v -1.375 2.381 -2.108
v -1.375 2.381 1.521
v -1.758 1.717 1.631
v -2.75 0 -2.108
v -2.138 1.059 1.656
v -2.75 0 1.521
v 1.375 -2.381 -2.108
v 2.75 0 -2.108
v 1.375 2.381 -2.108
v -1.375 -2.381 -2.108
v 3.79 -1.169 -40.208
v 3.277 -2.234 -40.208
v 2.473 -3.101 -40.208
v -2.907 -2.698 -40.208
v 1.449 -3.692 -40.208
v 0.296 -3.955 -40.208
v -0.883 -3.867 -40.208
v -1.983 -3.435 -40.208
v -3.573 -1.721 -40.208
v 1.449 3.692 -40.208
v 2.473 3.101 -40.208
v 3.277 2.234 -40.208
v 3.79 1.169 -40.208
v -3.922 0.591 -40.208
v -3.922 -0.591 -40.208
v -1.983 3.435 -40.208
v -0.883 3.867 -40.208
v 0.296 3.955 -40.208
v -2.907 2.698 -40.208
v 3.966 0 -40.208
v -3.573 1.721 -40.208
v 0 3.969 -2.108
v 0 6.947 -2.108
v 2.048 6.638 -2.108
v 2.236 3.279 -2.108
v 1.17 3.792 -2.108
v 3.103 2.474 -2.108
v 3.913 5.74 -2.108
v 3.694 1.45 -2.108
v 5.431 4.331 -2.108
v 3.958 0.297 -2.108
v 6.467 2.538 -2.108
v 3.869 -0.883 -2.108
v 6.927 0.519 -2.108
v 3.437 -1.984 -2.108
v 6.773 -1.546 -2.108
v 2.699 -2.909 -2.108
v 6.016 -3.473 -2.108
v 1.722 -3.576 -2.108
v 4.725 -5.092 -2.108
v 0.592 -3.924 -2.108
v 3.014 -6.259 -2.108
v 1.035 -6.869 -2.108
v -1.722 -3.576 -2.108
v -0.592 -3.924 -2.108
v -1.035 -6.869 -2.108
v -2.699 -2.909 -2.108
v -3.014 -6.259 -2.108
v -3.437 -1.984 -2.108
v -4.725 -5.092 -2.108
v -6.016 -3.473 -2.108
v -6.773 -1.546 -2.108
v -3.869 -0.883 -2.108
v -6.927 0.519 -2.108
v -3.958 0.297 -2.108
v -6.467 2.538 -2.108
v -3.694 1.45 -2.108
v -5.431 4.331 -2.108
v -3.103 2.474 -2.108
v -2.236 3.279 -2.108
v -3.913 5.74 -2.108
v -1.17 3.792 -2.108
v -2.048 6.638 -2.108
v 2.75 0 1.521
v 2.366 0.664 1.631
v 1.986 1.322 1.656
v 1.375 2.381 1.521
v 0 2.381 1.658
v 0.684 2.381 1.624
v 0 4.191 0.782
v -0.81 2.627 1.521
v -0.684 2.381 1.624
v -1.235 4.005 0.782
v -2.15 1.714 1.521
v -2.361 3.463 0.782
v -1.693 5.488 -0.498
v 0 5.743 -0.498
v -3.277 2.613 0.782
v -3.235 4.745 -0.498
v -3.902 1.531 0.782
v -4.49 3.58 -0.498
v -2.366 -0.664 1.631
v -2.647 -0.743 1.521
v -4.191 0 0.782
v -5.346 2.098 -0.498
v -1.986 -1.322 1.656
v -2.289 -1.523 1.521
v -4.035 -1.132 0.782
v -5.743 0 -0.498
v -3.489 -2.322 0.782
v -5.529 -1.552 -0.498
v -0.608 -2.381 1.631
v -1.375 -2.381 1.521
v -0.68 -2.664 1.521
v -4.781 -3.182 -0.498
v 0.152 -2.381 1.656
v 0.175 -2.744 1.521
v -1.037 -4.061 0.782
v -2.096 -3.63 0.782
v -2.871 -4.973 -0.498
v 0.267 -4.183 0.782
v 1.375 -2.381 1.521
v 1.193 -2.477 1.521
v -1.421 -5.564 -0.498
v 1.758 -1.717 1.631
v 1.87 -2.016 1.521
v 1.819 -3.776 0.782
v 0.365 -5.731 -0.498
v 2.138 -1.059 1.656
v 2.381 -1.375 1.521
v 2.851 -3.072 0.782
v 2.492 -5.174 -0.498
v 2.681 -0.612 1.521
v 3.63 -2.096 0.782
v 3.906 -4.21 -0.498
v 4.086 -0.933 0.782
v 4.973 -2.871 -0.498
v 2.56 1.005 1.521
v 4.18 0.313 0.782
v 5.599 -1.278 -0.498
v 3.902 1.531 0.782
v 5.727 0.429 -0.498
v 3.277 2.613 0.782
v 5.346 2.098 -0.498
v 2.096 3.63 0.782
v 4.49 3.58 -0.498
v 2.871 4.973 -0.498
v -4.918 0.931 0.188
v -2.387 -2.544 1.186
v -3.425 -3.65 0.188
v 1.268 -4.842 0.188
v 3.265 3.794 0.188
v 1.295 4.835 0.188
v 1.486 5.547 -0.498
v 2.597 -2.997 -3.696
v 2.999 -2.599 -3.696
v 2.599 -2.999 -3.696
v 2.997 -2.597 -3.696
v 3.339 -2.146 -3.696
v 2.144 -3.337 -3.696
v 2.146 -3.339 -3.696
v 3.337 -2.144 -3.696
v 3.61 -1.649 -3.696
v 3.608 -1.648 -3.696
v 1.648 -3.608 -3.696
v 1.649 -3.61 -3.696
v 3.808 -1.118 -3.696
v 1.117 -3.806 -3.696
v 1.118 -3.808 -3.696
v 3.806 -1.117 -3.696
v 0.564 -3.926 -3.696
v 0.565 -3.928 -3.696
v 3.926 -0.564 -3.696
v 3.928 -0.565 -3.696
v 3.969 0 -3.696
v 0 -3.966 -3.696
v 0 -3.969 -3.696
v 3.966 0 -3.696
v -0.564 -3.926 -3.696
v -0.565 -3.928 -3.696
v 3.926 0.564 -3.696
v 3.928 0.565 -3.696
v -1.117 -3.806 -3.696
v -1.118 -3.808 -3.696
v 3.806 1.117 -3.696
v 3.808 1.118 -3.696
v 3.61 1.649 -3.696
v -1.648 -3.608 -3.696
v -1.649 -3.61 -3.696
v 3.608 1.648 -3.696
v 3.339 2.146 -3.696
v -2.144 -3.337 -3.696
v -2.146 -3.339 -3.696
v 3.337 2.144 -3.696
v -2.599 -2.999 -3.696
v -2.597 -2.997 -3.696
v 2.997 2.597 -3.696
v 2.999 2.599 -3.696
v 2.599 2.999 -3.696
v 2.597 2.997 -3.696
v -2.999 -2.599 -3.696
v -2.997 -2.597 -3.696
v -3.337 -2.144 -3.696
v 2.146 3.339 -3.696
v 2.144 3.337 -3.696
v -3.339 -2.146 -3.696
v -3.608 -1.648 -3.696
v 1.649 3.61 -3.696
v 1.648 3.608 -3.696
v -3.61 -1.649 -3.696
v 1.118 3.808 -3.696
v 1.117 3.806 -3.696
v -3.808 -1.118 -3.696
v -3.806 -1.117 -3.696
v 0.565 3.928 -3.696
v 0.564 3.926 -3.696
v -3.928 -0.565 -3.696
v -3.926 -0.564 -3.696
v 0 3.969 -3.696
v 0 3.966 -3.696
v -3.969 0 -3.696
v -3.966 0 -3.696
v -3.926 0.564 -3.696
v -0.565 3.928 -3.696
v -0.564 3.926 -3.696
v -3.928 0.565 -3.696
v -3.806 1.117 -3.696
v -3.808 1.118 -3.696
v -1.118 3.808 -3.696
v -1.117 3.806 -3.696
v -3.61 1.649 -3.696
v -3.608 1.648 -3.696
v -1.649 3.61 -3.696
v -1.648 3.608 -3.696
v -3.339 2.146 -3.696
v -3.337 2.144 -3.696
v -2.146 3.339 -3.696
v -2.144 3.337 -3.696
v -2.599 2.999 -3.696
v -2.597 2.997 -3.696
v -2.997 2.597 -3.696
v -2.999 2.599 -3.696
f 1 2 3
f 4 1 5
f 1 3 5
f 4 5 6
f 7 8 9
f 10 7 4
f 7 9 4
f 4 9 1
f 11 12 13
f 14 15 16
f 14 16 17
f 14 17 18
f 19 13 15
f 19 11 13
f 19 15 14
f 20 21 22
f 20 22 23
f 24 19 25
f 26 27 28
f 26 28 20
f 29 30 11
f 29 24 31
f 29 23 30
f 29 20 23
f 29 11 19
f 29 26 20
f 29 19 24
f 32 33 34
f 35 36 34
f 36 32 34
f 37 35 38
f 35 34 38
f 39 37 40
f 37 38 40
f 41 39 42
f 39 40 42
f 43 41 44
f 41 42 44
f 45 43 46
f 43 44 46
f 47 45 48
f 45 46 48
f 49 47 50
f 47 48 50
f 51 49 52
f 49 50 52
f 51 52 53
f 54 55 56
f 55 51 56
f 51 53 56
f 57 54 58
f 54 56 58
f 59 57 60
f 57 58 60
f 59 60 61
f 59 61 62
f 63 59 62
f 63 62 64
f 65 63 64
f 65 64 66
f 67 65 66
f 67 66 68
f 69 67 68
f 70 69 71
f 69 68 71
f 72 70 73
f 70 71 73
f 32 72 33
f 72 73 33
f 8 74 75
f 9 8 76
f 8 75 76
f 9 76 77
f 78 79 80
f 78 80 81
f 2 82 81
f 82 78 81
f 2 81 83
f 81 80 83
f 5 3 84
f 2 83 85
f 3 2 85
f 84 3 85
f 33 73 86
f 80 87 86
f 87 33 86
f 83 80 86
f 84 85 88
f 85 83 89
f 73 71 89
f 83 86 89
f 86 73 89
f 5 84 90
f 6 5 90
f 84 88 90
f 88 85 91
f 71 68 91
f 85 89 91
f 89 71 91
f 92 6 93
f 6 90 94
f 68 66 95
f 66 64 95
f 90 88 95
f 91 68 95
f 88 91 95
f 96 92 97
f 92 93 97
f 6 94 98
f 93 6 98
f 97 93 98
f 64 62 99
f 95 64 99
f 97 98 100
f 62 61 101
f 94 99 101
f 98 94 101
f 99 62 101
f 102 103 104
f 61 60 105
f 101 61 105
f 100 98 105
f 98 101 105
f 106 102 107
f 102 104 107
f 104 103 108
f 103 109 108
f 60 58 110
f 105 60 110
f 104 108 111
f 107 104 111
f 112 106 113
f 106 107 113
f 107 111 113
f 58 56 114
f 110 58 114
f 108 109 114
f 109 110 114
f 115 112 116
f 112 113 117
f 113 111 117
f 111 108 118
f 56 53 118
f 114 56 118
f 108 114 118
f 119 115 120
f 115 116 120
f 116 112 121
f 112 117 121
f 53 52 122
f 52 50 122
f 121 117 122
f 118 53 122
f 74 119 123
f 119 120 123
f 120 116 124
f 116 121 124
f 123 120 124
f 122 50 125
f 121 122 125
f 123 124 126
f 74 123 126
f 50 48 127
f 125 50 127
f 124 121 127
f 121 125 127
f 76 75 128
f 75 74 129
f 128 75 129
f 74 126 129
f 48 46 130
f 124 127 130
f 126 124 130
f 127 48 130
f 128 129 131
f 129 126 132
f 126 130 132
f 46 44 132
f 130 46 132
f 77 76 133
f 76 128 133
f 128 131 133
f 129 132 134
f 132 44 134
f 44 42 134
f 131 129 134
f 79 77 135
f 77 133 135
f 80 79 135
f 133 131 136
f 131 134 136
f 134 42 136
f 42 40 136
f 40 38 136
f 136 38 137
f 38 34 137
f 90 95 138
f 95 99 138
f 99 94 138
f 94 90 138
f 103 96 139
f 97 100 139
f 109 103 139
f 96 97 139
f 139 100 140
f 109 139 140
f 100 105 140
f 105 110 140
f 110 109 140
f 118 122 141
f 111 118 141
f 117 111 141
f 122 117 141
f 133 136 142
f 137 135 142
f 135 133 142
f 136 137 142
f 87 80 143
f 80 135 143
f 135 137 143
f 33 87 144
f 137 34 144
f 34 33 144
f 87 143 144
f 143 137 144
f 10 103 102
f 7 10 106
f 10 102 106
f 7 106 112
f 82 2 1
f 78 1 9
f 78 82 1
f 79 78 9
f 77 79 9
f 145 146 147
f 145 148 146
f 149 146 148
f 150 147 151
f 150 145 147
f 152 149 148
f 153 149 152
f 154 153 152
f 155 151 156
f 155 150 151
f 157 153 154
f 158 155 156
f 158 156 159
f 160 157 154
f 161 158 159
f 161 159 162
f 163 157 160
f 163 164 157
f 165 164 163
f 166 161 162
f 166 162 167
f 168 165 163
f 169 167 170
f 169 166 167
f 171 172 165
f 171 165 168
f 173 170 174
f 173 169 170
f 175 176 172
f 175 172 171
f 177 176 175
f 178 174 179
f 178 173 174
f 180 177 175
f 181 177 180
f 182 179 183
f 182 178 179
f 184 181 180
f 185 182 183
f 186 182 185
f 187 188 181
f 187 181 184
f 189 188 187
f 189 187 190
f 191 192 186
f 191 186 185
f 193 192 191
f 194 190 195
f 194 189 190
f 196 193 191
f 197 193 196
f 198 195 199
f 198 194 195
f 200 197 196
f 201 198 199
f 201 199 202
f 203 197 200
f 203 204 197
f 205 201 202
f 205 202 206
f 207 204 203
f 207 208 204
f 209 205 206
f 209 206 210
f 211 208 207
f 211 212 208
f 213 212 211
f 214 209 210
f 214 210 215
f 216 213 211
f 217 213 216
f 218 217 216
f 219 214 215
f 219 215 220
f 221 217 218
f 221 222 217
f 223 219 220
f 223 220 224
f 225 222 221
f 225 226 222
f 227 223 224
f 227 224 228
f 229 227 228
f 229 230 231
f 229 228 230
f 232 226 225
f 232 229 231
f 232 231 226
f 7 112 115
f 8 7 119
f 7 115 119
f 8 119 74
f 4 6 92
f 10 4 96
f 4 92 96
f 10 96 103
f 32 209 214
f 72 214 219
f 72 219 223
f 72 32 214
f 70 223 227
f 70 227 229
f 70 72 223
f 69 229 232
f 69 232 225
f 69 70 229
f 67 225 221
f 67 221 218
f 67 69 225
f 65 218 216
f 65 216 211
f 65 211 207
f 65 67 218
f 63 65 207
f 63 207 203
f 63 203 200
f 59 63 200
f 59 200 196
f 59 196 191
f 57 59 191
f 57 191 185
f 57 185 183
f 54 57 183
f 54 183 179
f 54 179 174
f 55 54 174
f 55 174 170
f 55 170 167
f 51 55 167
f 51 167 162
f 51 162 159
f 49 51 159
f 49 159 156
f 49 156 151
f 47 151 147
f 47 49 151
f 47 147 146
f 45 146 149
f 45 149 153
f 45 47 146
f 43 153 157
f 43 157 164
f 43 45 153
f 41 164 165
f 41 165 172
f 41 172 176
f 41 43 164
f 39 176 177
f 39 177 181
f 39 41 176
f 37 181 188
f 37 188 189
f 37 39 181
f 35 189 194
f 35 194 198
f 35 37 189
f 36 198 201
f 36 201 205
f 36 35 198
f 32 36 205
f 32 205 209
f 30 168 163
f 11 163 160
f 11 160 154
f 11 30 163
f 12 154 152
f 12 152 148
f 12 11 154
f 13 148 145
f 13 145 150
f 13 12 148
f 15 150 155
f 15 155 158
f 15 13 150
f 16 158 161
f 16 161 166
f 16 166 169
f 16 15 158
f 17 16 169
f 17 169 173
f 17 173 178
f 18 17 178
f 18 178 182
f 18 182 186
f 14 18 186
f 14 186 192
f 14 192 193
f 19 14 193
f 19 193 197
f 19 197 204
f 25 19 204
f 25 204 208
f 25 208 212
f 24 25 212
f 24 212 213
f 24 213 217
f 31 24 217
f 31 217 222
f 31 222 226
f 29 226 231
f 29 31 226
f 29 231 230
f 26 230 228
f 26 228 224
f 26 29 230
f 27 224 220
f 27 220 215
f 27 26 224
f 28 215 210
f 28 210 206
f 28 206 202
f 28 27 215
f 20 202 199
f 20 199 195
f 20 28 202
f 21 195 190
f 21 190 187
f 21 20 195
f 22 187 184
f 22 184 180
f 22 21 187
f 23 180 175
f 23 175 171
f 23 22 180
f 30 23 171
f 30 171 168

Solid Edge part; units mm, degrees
sketch "Sketch1" plane through (0, 0, 0) normal (1, 0, 0) x (0, 1, 0)
  line L0 (0, -2.1082) -> (0, 2.1082)
  arc A0 (0, 2.1082) -> (6.9469, -2.1082) centre (-0.3606, -6.3169) cw
  line L1 (0, -2.1082) -> (6.9469, -2.1082)
  dimension "D1" = 4.2164
  dimension "D2" = 8.4328
revolve "RevolvedProtrusion1" add sketch "Sketch1" angle 360 about axis through (0, 0, -14.7796) along (0, 0, 1)
sketch "Sketch2" plane through (0, 0, -2.1082) normal (0, 0, -1) x (0, 1, 0)
  circle A0 centre (0, 0) radius 3.9687
  dimension "D1" = 7.9375
extrude "Protrusion1" add sketch "Sketch2" along normal blind 38.1
sketch "Sketch3" plane through (0, 0, -40.2082) normal (0, 0, -1) x (1, 0, 0)
  circle A0 centre (0, 0) radius 3.9662
  dimension "D1" = 0.0025
extrude "Cutout1" cut sketch "Sketch3" against normal blind 36.5125 flip side to cut
sketch "Sketch4" plane through (-0.6032, 0.3606, 4.2164) normal (0, 0, 1) x (1, 0, 0)
  line L0 (-0.7716, 2.0206) -> (1.978, 2.0206)
  line L1 (3.3529, -0.3606) -> (1.978, 2.0206)
  line L2 (1.978, -2.7419) -> (3.3529, -0.3606)
  line L3 (-0.7716, -2.7419) -> (1.978, -2.7419)
  line L4 (-2.1464, -0.3606) -> (-0.7716, -2.7419)
  line L5 (-0.7716, 2.0206) -> (-2.1464, -0.3606)
extrude "ExtrudedCutout_11" cut sketch "Sketch4" against normal blind 6.3246
properties part number "162413"
